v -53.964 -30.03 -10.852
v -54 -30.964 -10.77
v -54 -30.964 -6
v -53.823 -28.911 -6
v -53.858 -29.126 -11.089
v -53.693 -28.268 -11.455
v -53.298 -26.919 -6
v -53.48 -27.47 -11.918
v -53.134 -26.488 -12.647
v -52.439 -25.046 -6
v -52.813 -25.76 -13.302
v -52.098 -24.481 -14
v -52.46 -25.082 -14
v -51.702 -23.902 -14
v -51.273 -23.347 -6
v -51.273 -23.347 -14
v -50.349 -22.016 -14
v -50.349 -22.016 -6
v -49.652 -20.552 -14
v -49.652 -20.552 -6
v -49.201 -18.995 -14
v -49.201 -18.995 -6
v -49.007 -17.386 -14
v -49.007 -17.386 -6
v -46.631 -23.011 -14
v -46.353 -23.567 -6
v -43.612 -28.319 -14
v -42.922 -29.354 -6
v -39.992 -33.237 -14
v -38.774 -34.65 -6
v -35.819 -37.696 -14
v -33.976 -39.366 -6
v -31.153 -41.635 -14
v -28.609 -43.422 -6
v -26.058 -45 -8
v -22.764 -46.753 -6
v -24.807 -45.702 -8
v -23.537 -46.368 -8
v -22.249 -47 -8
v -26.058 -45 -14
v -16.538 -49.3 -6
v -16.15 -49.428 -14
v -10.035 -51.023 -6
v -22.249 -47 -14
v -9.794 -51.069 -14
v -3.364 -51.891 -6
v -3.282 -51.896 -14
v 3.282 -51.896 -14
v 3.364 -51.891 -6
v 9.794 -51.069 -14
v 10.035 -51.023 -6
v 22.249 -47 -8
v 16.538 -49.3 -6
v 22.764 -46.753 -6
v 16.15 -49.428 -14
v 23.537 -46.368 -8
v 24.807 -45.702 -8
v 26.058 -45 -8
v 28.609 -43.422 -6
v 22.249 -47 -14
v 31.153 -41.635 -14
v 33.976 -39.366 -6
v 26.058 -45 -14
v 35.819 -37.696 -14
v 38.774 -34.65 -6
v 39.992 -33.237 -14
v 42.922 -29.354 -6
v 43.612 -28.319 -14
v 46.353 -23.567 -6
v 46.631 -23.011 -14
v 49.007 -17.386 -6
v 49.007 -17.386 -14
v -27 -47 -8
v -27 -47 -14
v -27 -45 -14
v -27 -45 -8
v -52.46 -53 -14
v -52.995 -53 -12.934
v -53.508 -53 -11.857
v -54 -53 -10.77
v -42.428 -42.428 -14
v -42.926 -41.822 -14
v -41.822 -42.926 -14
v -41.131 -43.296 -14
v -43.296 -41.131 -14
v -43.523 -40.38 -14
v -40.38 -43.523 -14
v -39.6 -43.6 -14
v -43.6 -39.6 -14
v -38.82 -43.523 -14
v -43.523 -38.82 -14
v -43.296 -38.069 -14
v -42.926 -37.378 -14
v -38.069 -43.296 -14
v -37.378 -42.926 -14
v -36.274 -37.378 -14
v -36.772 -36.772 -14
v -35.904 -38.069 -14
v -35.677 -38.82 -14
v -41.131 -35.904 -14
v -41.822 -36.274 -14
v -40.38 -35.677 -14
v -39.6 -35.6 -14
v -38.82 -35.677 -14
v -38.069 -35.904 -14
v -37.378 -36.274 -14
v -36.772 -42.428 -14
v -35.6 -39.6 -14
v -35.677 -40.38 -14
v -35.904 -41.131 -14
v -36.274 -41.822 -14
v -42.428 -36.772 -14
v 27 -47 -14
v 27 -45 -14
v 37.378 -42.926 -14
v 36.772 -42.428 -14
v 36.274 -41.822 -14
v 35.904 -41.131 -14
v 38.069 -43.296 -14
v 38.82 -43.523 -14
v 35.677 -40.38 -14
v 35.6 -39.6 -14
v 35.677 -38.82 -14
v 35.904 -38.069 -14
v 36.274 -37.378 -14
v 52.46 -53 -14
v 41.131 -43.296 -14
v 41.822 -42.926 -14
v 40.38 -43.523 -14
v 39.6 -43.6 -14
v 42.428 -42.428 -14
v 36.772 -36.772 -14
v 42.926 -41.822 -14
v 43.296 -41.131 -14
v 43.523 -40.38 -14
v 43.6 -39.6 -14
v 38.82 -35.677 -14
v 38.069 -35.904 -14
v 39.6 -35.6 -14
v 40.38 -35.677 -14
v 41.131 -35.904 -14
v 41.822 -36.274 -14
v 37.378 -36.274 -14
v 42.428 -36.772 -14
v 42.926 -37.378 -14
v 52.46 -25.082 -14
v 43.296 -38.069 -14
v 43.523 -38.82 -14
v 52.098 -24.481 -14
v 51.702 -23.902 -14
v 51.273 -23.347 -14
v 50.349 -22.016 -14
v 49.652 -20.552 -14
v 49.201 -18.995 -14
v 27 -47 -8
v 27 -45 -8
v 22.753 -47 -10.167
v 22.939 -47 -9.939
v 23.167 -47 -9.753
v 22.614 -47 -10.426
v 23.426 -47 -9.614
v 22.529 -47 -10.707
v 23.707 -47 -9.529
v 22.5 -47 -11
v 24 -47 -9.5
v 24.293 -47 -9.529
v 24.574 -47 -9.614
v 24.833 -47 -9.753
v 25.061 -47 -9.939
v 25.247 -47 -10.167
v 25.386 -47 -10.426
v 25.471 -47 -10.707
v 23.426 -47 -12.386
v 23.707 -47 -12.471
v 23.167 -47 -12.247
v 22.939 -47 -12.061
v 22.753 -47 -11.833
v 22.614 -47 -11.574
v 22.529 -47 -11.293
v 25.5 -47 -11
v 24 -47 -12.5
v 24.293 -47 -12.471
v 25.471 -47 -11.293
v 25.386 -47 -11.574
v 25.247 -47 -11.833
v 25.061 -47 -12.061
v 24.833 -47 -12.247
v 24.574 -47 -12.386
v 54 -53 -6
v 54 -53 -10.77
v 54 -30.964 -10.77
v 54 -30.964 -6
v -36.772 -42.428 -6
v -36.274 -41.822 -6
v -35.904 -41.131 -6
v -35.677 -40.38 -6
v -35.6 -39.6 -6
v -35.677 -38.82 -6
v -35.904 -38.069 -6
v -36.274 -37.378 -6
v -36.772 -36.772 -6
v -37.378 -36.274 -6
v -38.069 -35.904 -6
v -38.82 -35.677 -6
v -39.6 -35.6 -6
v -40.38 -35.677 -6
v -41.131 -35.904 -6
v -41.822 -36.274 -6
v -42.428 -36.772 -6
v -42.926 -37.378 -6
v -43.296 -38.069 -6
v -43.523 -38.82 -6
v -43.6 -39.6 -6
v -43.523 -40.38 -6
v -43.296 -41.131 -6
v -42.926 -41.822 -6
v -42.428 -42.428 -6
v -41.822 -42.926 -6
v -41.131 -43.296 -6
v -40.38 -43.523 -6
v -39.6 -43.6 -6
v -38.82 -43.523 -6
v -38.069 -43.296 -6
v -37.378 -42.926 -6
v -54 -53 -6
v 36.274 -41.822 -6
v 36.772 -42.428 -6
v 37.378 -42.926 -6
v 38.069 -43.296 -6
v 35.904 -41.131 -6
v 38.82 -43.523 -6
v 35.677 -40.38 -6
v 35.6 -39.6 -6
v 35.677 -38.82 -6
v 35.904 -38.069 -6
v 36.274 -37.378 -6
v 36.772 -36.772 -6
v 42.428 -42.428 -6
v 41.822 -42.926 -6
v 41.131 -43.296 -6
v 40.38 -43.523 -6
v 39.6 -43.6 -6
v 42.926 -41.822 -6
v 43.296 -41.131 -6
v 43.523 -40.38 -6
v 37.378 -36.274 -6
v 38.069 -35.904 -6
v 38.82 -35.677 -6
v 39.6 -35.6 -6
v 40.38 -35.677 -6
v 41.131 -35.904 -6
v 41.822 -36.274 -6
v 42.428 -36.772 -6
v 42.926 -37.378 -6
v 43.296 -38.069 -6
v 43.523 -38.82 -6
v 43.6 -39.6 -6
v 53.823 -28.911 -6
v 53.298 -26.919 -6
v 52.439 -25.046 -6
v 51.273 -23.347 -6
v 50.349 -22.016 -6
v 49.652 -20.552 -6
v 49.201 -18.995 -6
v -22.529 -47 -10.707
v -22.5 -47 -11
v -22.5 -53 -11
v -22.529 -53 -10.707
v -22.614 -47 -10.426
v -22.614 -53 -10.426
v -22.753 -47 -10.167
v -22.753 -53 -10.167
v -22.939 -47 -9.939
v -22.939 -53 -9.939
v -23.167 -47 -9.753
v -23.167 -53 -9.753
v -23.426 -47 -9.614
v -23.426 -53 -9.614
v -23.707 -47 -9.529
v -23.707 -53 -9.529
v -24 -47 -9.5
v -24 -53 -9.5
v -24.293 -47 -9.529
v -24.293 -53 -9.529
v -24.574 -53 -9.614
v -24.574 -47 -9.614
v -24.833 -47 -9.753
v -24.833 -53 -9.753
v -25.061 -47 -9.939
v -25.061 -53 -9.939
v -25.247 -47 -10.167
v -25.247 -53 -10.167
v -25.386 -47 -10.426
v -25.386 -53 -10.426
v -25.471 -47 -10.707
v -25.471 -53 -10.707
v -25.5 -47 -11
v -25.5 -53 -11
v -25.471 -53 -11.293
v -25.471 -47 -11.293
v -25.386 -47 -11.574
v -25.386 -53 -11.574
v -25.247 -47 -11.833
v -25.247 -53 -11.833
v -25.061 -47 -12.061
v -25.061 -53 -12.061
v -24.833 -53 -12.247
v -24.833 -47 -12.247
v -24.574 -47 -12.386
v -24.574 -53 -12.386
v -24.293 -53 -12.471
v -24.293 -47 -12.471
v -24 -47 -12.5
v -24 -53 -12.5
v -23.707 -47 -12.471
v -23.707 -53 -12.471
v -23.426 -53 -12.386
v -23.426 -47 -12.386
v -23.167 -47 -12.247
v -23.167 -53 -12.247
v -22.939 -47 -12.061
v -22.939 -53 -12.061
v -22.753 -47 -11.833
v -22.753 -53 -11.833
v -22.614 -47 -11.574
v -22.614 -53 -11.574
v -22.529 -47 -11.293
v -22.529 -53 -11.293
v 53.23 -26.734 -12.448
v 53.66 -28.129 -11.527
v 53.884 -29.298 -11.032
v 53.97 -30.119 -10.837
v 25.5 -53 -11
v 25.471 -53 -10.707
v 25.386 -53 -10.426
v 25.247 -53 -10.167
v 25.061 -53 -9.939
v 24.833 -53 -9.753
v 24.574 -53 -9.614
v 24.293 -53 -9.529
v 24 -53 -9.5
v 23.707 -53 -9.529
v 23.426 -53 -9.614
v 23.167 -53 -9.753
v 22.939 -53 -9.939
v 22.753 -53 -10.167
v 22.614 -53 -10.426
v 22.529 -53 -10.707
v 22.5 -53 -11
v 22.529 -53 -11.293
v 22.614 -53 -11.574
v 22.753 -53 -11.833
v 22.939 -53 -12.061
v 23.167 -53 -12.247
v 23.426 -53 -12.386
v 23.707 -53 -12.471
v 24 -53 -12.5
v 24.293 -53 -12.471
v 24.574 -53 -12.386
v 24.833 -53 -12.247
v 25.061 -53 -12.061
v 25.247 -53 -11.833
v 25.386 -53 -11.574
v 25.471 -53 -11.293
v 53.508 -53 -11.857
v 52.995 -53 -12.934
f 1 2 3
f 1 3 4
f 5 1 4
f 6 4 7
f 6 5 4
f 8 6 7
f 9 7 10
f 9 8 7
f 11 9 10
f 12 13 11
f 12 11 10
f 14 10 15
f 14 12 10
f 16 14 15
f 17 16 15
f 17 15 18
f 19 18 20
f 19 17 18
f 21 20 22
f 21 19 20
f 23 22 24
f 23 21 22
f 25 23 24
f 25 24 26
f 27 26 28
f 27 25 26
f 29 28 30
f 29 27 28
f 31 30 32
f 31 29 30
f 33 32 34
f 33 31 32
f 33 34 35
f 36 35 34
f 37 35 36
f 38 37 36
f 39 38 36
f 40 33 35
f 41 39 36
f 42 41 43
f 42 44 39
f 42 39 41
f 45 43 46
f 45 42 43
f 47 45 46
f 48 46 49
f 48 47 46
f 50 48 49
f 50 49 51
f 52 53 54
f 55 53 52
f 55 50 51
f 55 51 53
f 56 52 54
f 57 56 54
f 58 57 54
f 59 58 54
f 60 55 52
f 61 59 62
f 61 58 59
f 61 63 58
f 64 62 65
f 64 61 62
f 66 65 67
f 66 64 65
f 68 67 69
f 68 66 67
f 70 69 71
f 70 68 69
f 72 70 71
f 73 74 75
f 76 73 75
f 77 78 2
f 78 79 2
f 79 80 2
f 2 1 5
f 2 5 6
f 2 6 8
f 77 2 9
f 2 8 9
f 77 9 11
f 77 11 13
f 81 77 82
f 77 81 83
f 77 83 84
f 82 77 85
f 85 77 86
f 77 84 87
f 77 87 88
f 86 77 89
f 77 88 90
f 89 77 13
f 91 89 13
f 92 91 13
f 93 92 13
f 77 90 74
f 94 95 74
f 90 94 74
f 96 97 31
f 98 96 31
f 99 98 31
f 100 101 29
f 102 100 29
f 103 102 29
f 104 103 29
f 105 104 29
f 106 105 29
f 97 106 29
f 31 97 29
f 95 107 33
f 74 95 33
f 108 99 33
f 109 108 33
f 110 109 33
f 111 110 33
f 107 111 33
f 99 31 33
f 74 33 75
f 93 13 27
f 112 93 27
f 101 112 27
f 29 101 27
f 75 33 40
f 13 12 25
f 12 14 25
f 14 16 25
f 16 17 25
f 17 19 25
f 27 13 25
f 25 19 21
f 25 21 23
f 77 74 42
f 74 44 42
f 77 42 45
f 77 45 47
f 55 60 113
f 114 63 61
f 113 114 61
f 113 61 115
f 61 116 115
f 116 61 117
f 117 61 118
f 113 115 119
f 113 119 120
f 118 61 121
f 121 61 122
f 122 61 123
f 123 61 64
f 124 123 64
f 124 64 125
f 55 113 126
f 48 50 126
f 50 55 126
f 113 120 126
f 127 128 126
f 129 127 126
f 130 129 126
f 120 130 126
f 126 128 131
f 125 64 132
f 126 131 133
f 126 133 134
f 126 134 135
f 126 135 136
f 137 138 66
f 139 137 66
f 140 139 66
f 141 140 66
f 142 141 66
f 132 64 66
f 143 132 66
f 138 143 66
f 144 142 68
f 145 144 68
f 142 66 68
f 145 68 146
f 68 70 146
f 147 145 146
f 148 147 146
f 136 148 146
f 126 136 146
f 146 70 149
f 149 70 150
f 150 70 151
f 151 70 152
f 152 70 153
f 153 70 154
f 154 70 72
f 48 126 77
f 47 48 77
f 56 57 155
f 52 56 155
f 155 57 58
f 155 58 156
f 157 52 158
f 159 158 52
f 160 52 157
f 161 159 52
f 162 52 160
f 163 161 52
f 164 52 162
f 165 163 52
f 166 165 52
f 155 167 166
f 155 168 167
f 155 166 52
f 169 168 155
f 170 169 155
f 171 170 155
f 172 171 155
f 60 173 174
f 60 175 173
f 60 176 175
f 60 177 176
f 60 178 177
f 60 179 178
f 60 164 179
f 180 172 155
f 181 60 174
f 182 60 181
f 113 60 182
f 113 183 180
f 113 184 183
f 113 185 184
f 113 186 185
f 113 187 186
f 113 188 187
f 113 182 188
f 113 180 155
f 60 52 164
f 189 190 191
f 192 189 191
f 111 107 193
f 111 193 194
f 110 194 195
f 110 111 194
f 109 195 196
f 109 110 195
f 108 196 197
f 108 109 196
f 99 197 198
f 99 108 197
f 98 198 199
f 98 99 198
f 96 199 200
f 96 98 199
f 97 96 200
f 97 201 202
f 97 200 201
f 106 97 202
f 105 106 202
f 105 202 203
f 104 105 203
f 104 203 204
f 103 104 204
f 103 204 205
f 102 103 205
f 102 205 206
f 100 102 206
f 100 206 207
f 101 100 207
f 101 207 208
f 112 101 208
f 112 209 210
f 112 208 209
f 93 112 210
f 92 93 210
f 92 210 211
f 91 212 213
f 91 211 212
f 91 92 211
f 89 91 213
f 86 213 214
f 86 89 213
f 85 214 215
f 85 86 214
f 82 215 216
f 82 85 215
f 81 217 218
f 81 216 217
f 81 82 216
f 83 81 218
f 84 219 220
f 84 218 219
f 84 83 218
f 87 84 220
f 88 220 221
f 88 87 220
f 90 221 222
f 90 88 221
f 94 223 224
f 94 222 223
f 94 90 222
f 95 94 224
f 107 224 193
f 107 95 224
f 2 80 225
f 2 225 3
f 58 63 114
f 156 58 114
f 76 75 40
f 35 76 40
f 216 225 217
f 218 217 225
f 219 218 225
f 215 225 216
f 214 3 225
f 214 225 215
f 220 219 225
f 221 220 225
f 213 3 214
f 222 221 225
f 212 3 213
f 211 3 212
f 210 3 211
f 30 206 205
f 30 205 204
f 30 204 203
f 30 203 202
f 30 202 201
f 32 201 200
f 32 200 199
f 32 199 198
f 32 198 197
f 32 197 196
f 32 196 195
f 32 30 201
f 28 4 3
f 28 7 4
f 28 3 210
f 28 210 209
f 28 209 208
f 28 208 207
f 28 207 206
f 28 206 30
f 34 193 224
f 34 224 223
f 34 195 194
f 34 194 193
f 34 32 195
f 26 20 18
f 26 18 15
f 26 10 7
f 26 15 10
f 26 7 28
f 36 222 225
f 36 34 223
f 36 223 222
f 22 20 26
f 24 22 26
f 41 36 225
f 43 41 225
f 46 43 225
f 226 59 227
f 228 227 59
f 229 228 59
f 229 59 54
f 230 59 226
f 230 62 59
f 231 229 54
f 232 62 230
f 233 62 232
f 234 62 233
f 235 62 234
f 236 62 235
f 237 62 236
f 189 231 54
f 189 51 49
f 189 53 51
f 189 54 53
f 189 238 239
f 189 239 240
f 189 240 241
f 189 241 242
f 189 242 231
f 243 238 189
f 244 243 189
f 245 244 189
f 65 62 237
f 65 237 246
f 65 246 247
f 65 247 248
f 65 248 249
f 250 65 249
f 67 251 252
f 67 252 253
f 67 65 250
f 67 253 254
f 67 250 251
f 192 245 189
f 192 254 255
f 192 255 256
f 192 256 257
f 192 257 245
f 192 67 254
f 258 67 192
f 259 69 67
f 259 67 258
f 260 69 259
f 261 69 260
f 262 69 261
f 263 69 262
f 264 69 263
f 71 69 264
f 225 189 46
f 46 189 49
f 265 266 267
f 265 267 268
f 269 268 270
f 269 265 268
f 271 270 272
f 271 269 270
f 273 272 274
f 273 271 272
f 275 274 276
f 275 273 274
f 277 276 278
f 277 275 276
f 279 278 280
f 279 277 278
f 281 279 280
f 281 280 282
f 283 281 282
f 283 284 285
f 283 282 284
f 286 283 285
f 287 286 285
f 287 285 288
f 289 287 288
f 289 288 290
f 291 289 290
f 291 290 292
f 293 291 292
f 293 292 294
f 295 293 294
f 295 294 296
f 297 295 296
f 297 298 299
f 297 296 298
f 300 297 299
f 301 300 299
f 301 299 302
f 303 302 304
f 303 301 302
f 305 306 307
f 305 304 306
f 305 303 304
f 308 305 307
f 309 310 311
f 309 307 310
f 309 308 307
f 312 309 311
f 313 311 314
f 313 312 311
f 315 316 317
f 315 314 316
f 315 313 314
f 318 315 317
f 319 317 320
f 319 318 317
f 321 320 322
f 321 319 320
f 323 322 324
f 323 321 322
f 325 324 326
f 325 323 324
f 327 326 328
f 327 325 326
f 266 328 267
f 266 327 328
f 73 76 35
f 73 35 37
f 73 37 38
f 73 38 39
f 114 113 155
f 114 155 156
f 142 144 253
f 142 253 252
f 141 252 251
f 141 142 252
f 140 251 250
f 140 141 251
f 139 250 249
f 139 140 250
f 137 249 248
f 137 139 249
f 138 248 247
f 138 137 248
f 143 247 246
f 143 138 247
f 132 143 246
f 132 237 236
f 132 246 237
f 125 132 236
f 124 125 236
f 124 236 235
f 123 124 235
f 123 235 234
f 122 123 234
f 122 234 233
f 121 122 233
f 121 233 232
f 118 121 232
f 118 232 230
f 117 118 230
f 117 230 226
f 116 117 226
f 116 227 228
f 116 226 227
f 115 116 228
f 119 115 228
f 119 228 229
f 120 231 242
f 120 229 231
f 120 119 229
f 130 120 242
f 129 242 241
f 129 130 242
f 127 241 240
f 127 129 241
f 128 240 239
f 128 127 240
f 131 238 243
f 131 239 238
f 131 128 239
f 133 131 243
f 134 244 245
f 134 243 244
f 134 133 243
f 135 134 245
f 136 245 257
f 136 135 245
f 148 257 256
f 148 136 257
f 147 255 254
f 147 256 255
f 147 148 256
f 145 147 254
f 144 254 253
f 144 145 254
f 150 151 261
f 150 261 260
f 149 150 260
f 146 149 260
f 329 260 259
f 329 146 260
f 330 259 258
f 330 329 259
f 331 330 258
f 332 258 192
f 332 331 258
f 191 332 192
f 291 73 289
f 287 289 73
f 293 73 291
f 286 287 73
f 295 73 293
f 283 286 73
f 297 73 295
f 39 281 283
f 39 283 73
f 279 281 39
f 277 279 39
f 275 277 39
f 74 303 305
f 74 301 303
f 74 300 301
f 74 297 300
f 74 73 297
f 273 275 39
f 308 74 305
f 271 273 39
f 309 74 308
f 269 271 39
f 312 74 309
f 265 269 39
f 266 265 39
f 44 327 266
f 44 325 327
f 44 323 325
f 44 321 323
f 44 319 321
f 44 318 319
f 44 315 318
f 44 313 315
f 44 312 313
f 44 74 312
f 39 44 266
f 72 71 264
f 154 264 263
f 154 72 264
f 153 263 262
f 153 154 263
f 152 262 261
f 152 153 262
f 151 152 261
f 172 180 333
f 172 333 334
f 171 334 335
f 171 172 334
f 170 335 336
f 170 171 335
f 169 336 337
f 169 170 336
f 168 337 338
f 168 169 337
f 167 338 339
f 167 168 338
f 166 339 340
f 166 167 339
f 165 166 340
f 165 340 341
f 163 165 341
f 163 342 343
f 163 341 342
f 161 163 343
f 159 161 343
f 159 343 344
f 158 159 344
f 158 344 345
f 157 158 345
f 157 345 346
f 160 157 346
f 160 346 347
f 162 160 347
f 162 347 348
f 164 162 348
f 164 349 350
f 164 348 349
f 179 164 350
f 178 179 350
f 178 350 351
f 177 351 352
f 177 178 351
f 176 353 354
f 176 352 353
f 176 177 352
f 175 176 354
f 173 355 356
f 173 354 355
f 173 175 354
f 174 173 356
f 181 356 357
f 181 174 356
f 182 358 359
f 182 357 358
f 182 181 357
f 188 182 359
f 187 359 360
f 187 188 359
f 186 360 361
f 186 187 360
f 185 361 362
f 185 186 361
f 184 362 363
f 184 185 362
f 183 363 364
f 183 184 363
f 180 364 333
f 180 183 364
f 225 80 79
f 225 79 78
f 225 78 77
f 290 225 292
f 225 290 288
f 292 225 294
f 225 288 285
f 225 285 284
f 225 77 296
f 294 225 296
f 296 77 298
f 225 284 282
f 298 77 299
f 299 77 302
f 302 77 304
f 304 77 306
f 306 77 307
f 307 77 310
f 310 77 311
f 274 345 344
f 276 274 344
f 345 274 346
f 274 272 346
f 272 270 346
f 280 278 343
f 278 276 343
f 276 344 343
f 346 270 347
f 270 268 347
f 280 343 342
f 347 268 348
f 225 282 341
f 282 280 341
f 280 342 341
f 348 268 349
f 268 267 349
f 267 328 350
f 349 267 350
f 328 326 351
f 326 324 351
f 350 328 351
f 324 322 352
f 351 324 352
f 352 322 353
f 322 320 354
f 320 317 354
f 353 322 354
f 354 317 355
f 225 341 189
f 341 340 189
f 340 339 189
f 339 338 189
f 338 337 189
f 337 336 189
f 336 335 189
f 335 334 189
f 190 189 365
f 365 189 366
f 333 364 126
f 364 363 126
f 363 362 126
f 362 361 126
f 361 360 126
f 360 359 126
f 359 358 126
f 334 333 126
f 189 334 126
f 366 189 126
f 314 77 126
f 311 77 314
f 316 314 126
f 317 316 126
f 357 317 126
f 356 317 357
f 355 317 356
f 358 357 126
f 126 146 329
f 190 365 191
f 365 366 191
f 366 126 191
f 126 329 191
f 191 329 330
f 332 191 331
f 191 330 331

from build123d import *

# Parameters (mm, degrees)
CYLINDER1548_R               = 59
CYLINDER1548_DEPTH           = 40
CYLINDER1546_R               = 1.5
CYLINDER1546_DEPTH           = 20
CYLINDER1538_R               = 1.5
CYLINDER1538_DEPTH           = 20
CYLINDER1502_R               = 1.5
CYLINDER1502_DEPTH           = 20
CYLINDER1540_R               = 1.5
CYLINDER1540_DEPTH           = 20
BOX540_W                     = 6
BOX540_H                     = 2
BOX540_DEPTH                 = 6
BOX536_W                     = 6
BOX536_H                     = 2
BOX536_DEPTH                 = 6
BOX535_W                     = 6
BOX535_H                     = 2
BOX535_DEPTH                 = 6
BOX539_W                     = 6
BOX539_H                     = 2
BOX539_DEPTH                 = 6
CYLINDER1512_R               = 4
CYLINDER1512_DEPTH           = 20
CYLINDER1512_PLACEMENT_ANGLE = 45
CYLINDER1539_R               = 4
CYLINDER1539_DEPTH           = 20
CYLINDER1539_PLACEMENT_ANGLE = 45
CYLINDER1510_R               = 10
CYLINDER1510_DEPTH           = 40
CYLINDER1541_R               = 10
CYLINDER1541_DEPTH           = 40
CYLINDER1537_R               = 52
CYLINDER1537_DEPTH           = 8
BOX537_W                     = 108
BOX537_H                     = 36
BOX537_DEPTH                 = 8
FILLET024_R                  = 12


with BuildPart() as v_lec1548:
    # Cylinder1548 → Cylinder1548 (new body)
    with BuildSketch(Plane(origin=(0, -17, 13), x_dir=(1, 0, 0), z_dir=(0, -1, 0))):
        Circle(CYLINDER1548_R)
    extrude(amount=CYLINDER1548_DEPTH)


with BuildPart() as v_lec1546:
    # Cylinder1546 → Cylinder1546 (new body)
    with BuildSketch(Plane(origin=(24, -40, -5), x_dir=(1, 0, 0), z_dir=(0, -1, 0))):
        Circle(CYLINDER1546_R)
    extrude(amount=CYLINDER1546_DEPTH)


with BuildPart() as v_lec1538:
    # Cylinder1538 → Cylinder1538 (new body)
    with BuildSketch(Plane(origin=(51, -40, 7), x_dir=(1, 0, 0), z_dir=(0, -1, 0))):
        Circle(CYLINDER1538_R)
    extrude(amount=CYLINDER1538_DEPTH)


with BuildPart() as v_lec1502:
    # Cylinder1502 → Cylinder1502 (new body)
    with BuildSketch(Plane(origin=(-51, -40, 7), x_dir=(1, 0, 0), z_dir=(0, -1, 0))):
        Circle(CYLINDER1502_R)
    extrude(amount=CYLINDER1502_DEPTH)


with BuildPart() as compound912:
    # Cylinder1540 → Cylinder1540 (new body)
    with BuildSketch(Plane(origin=(-24, -40, -5), x_dir=(1, 0, 0), z_dir=(0, -1, 0))):
        Circle(CYLINDER1540_R)
    extrude(amount=CYLINDER1540_DEPTH)

    # Compound912: union Válec1546, Válec1538, Válec1502
    add(v_lec1546.part)
    add(v_lec1538.part)
    add(v_lec1502.part)


with BuildPart() as krychle540:
    # Box540 → Box540 (new body)
    with BuildSketch(Plane(origin=(21, -47, -8), x_dir=(1, 0, 0), z_dir=(0, 0, 1))):
        with Locations((3, 1)):
            Rectangle(BOX540_W, BOX540_H)
    extrude(amount=BOX540_DEPTH)


with BuildPart() as krychle536:
    # Box536 → Box536 (new body)
    with BuildSketch(Plane(origin=(48, -45, 4), x_dir=(1, 0, 0), z_dir=(0, 0, 1))):
        with Locations((3, 1)):
            Rectangle(BOX536_W, BOX536_H)
    extrude(amount=BOX536_DEPTH)


with BuildPart() as krychle535:
    # Box535 → Box535 (new body)
    with BuildSketch(Plane(origin=(-54, -45, 4), x_dir=(1, 0, 0), z_dir=(0, 0, 1))):
        with Locations((3, 1)):
            Rectangle(BOX535_W, BOX535_H)
    extrude(amount=BOX535_DEPTH)


with BuildPart() as compound916:
    # Box539 → Box539 (new body)
    with BuildSketch(Plane(origin=(-27, -47, -8), x_dir=(1, 0, 0), z_dir=(0, 0, 1))):
        with Locations((3, 1)):
            Rectangle(BOX539_W, BOX539_H)
    extrude(amount=BOX539_DEPTH)

    # Compound916: union Krychle540, Krychle536, Krychle535
    add(krychle540.part)
    add(krychle536.part)
    add(krychle535.part)


with BuildPart() as v_lec1512:
    # Cylinder1512 → Cylinder1512 (new body)
    with BuildSketch(Plane.XY):
        Circle(CYLINDER1512_R)
    extrude(amount=CYLINDER1512_DEPTH)


with BuildPart() as v_lec1512_1:
    # Cylinder1512 placement: moved
    add(v_lec1512.part.moved(Location((39.6, -39.6, -10))).rotate(Axis((39.6, -39.6, -10), (0, 0, 1)), CYLINDER1512_PLACEMENT_ANGLE))


with BuildPart() as compound921:
    # Cylinder1539 → Cylinder1539 (new body)
    with BuildSketch(Plane.XY):
        Circle(CYLINDER1539_R)
    extrude(amount=CYLINDER1539_DEPTH)


with BuildPart() as compound921_1:
    # Cylinder1539 placement: moved
    add(compound921.part.moved(Location((-39.6, -39.6, -10))).rotate(Axis((-39.6, -39.6, -10), (0, 0, -1)), CYLINDER1539_PLACEMENT_ANGLE))

    # Compound921: union Válec1512
    add(v_lec1512_1.part)


with BuildPart() as v_lec1510:
    # Cylinder1510 → Cylinder1510 (new body)
    with BuildSketch(Plane(origin=(-59, -17, 0), x_dir=(1, 0, 0), z_dir=(0, 0, 1))):
        Circle(CYLINDER1510_R)
    extrude(amount=CYLINDER1510_DEPTH)


with BuildPart() as compound919:
    # Cylinder1541 → Cylinder1541 (new body)
    with BuildSketch(Plane(origin=(59, -17, 0), x_dir=(1, 0, 0), z_dir=(0, 0, 1))):
        Circle(CYLINDER1541_R)
    extrude(amount=CYLINDER1541_DEPTH)

    # Compound919: union Válec1510
    add(v_lec1510.part)


with BuildPart() as v_lec1537:
    # Cylinder1537 → Cylinder1537 (new body)
    with BuildSketch(Plane.XY.offset(20)):
        Circle(CYLINDER1537_R)
    extrude(amount=CYLINDER1537_DEPTH)


with BuildPart() as common006:
    # Box537 → Box537 (new body)
    with BuildSketch(Plane(origin=(-54, -53, 20), x_dir=(1, 0, 0), z_dir=(0, 0, 1))):
        with Locations((54, 18)):
            Rectangle(BOX537_W, BOX537_H)
    extrude(amount=BOX537_DEPTH)

    # Cut548: cut Válec1537
    add(v_lec1537.part, mode=Mode.SUBTRACT)


with BuildPart() as common006_1:
    # Cut548 placement: moved
    add(common006.part.moved(Location((0, 0, -20))))

    # Cut544: cut Compound919
    add(compound919.part, mode=Mode.SUBTRACT)


with BuildPart() as common006_2:
    # Cut544 placement: moved
    add(common006_1.part.moved(Location((0, 0, -8))))

    # Cut546: cut Compound921
    add(compound921_1.part, mode=Mode.SUBTRACT)

    # Cut547: cut Compound916
    add(compound916.part, mode=Mode.SUBTRACT)

    # Cut545: cut Compound912
    add(compound912.part, mode=Mode.SUBTRACT)

    # Fillet024
    fillet024_edges = [common006_2.edges().sort_by_distance(p)[0] for p in [
        (-54, -25.660254, -4),
        (54, -25.660254, -4),
    ]]
    fillet(fillet024_edges, radius=FILLET024_R)


with BuildPart() as common006_3:
    # Fillet024 placement: moved
    add(common006_2.part.moved(Location((0, 0, -6))))

    # Common006: intersect Válec1548
    add(v_lec1548.part, mode=Mode.INTERSECT)


solid = common006_3.part
